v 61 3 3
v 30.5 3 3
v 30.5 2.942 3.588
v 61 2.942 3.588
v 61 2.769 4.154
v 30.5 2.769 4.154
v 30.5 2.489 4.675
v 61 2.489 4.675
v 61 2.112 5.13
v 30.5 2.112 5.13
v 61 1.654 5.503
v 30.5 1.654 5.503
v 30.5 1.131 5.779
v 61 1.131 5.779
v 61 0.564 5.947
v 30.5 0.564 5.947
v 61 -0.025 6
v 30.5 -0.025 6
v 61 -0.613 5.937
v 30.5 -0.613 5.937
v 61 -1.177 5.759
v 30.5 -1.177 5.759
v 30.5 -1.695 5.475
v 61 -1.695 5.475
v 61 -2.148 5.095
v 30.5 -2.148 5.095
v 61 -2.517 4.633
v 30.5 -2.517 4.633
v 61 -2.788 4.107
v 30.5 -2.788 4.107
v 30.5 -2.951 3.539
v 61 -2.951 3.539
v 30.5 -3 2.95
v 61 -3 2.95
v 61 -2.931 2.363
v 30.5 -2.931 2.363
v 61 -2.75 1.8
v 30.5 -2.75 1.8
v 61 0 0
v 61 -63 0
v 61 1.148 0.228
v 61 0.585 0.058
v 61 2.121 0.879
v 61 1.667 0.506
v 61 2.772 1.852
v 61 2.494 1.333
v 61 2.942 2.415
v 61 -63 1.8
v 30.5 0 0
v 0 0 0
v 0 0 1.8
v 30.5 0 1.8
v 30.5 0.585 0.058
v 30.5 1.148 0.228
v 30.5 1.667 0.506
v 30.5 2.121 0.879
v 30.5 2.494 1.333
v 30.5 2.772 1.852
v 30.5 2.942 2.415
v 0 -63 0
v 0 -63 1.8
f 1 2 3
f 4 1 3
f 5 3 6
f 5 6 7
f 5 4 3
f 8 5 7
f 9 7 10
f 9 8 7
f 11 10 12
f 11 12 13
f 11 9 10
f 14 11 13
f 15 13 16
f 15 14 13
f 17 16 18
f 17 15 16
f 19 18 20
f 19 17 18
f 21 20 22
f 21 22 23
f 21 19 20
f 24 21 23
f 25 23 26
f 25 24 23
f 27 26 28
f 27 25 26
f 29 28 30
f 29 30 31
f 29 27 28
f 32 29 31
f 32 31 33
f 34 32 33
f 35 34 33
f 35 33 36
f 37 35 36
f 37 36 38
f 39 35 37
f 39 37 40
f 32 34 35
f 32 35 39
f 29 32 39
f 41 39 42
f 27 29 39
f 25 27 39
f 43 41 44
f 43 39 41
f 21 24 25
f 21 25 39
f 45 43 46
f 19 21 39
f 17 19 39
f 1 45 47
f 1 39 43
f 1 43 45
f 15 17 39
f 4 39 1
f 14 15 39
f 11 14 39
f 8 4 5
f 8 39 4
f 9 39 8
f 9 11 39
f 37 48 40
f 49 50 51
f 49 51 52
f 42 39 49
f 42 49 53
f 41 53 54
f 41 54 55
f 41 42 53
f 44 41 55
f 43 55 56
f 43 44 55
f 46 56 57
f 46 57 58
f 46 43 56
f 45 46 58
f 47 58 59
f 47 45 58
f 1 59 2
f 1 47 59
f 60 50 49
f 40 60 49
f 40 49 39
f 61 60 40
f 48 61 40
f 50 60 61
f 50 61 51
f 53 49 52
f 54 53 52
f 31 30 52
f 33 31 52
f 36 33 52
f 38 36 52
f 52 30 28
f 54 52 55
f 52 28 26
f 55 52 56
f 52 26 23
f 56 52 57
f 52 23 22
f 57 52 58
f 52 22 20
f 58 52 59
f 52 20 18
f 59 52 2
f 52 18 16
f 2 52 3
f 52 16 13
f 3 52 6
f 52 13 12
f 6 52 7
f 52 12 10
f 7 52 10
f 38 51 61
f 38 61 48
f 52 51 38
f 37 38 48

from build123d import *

# Parameters (mm, degrees)
F0_W     = 61
F0_H     = 63
F1_DEPTH = 1.8
F3_DEPTH = 30.5


with BuildPart() as f1:
    # F0 (on Top) → F1 (new body)
    with BuildSketch(Plane.XY):
        with Locations((30.5, -31.5)):
            Rectangle(F0_W, F0_H)
    extrude(amount=F1_DEPTH)

    # F2 (on face) → F3 (join)
    with BuildSketch(Plane.YZ.offset(61)):
        with BuildLine():
            Line((0, 1.8), (0, 0))
            ThreePointArc((0, 0), (2.1213203436, 0.8786796564), (3, 3))
            ThreePointArc((3, 3), (-0.6129289311, 5.9367189388), (-2.749545417, 1.8))
            Line((-2.749545417, 1.8), (0, 1.8))
        make_face()
        with BuildLine():
            ThreePointArc((-2.749545417, 1.8), (-1.6431676725, 0.4900199204), (0, 0))
            Line((0, 0), (0, 1.8))
            Line((0, 1.8), (-2.749545417, 1.8))
        make_face()
    extrude(amount=-F3_DEPTH)


solid = f1.part
